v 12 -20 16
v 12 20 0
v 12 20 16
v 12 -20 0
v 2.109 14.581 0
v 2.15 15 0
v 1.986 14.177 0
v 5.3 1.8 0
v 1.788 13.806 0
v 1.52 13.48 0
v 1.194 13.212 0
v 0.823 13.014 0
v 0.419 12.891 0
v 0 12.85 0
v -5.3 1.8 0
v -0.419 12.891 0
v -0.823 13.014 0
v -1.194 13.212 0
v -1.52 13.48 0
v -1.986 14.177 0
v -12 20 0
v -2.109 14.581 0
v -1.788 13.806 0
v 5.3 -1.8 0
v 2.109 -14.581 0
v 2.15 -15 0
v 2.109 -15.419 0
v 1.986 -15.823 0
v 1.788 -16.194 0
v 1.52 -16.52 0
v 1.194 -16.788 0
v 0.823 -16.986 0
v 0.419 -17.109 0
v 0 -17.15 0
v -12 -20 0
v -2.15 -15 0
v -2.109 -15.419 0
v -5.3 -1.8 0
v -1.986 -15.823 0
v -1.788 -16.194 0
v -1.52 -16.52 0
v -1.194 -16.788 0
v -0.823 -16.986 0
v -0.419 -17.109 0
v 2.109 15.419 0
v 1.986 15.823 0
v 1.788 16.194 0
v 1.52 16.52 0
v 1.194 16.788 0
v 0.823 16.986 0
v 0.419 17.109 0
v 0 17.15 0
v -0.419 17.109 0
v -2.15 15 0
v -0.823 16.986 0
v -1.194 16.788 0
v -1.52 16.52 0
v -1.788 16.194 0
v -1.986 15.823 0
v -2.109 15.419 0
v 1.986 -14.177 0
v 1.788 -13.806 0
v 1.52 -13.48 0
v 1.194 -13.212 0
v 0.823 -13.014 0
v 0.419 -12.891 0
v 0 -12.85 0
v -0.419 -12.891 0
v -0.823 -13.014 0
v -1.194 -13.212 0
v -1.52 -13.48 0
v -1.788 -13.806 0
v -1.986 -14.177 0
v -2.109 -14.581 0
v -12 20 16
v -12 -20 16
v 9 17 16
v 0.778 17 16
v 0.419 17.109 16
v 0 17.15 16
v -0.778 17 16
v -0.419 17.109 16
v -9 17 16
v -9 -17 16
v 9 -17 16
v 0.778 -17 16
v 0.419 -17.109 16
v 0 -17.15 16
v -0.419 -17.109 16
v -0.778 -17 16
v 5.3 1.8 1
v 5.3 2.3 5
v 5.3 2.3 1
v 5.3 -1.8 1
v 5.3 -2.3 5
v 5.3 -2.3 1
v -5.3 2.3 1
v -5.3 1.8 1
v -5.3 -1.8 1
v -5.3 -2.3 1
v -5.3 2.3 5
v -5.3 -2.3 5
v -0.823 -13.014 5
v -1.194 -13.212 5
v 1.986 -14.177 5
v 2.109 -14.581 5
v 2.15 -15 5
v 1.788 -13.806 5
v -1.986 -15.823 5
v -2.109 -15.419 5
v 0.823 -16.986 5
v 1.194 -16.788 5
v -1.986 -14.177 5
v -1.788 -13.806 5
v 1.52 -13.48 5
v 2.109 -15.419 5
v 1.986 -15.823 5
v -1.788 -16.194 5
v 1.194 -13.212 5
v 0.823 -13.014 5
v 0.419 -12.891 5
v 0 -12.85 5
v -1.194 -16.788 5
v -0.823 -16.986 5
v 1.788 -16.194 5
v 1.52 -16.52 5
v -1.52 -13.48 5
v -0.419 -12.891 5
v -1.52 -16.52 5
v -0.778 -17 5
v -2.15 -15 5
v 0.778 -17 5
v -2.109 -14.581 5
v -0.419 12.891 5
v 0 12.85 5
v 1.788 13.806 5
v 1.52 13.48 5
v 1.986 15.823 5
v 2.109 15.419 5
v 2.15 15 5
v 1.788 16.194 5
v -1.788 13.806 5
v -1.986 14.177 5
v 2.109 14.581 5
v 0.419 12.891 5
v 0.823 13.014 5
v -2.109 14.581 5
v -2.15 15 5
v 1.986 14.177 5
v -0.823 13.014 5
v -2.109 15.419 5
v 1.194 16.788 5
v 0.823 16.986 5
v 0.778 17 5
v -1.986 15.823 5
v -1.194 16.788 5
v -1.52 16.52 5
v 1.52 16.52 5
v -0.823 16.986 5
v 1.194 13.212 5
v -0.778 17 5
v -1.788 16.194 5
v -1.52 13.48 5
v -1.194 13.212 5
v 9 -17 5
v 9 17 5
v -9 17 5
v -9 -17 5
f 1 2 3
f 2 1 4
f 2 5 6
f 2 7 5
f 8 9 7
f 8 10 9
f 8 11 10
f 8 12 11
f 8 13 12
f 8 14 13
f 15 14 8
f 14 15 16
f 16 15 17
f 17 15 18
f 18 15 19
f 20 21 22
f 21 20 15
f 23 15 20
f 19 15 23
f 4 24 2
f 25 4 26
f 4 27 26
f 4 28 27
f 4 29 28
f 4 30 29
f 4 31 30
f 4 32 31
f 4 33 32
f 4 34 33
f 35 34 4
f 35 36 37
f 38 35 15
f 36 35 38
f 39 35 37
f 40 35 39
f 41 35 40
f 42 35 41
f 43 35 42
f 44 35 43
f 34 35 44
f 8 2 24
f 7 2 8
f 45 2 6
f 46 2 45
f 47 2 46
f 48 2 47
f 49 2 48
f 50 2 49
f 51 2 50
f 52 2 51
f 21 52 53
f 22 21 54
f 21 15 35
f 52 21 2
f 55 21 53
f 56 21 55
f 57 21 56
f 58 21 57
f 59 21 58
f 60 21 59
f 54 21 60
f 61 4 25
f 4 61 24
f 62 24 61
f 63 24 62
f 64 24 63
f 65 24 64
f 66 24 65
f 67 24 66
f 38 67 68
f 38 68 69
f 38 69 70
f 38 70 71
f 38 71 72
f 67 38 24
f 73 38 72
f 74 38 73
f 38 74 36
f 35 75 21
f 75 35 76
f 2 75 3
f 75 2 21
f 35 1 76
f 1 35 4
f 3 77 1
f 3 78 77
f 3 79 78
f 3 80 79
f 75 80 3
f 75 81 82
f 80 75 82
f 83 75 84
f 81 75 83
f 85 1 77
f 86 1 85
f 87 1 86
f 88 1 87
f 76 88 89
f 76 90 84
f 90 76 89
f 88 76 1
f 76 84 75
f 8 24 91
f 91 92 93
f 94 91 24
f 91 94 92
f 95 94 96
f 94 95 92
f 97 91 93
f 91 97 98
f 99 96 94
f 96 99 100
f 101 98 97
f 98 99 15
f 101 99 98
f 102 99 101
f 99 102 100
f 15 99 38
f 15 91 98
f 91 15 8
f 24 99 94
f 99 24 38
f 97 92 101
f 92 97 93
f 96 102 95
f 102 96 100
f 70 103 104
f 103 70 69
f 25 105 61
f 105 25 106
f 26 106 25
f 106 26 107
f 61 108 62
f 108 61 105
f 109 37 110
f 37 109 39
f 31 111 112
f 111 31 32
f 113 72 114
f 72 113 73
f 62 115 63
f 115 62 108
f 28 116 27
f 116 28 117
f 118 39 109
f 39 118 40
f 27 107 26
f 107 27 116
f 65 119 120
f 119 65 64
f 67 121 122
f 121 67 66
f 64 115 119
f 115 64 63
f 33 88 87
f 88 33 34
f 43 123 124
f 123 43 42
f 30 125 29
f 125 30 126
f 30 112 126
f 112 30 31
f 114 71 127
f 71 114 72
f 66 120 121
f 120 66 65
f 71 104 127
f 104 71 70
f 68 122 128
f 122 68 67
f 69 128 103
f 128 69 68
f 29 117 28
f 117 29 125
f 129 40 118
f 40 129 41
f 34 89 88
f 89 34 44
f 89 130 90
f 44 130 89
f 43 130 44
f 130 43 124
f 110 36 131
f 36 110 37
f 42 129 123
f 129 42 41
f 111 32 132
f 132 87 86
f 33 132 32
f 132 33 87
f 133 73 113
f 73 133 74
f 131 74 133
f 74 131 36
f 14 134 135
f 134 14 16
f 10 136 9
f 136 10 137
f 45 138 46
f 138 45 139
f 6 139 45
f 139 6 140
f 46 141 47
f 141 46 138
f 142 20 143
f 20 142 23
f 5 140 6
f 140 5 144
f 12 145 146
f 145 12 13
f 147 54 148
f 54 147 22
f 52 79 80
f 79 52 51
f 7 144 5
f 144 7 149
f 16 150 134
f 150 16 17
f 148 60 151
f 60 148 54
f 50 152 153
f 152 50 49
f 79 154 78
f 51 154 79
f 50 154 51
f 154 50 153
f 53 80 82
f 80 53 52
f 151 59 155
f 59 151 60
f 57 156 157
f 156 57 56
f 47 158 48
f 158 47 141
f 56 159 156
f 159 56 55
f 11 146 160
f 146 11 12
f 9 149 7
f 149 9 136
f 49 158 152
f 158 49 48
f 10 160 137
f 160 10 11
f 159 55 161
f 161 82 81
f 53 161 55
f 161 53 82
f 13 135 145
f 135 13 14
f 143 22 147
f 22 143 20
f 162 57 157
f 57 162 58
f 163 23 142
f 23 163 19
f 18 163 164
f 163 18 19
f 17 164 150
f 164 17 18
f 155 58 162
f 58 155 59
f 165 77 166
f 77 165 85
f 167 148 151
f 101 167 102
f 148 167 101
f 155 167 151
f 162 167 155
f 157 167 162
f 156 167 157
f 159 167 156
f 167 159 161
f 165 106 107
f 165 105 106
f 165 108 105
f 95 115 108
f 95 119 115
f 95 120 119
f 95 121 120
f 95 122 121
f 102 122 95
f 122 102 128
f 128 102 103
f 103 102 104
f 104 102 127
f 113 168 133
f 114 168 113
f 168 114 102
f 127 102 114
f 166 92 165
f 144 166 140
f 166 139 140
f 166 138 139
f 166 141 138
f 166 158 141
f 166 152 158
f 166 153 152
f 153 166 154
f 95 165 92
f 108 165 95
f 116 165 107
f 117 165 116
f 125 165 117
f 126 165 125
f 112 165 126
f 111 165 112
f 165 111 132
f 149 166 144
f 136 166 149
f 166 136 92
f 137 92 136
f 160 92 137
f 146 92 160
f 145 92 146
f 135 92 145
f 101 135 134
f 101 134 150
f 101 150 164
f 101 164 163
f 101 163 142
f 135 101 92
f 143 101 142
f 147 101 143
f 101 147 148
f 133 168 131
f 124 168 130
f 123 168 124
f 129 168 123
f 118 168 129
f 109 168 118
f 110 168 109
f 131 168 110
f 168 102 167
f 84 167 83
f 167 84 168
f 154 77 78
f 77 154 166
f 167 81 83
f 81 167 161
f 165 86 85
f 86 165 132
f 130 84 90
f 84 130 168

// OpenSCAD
// ============================================================
// RSAポート用 ポゴピン"ブロック"収納ハウジング
// ============================================================
//
// 対象部品: 貫通型ポゴピンブロック（表裏に4本ずつ、見た目のチップは
// 計8個だが表裏は電気的に同じ線でつながっており独立回路は4系統）。
//
// 実測値（2026-09-01ユーザー計測）:
//   - ブロック全長（ピンが並ぶ方向, X） = 10mm
//   - ブロック厚み（ピンが突き出る方向, Z）= 5mm
//   - ポゴピン全長                       = 10mm
//     → 前後に (10-5)/2 = 2.5mm ずつ突出する計算
//
// 【未確認・要注意】
//   - 幅（Y方向、行に対して垂直の奥行き）は未計測。block_width_y は
//     プレースホルダーなので実物と合わなければ調整すること
//   - このブロックは独立4系統しかなく、CAN方式で必要な5系統
//     （VCC/CANH/CANL/AD_COM/GND）には1本足りない。AD_COM用に
//     バラの個別ポゴピンを追加するか、要件を見直す必要がある
//     （本ファイルは「ブロックを収める箱」だけを提供する）
//   - ピンのばね圧縮ストロークが2.5mmより短い場合、実機に密着させた
//     ときに底突きする可能性がある。組み立て後に必ず確認すること
//
// 【固定方法】
//   ブロックの前面が内側の段差（肩）に突き当たって止まる構造。
//   前面窓は奥のポケットよりY方向だけ一回り小さくしてあり
//   （X方向はピン位置が不明なため窓を狭めない＝全長ぶん開けておく）、
//   ここでピンの頭だけが外に出る。ブロック本体はその奥の
//   ポケット（block_len×block_width_y×block_thickness、
//   pocket_clearance分の余裕）に収まり、肩に当たった位置で止まるので
//   押し込む深さで迷わない。仮固定後、配線室側からエポキシを
//   流し込んで固定する。
//
// ============================================================

// ---------- PARAMETERS ----------

block_len        = 10;   // 実測: ピン並び方向の全長 [mm]
block_thickness  = 5;    // 実測: ピン突出方向の厚み [mm]
block_width_y    = 4;    // ★未実測(推定値): 奥行き方向の幅 [mm]。実物に合わせて調整
pocket_clearance = 0.3;  // ブロックとポケットの片側クリアランス [mm]

shoulder_depth     = 1.0; // 前面の肩（窓）の厚み [mm]
pin_window_margin_y = 0.5; // 前面窓をY方向だけ狭める片側マージン[mm]（肩の幅になる）
                            // X方向は窓を狭めない（ピンの正確な位置が未確認のため塞がない）

// 上下のM4固定穴（RSAポート実測前のプレースホルダー。rsa_pogo_housing.scadと同じ値）
mount_hole_dia      = 4.3;
mount_hole_spacing  = 30.0;
mount_hole_offset_x = 0;

// ハウジング寸法
housing_w = 24;
housing_h = 40;
housing_wall_t = 3;
wire_cavity_depth = 10;

// ---------- 内部計算 ----------
plate_t = shoulder_depth + block_thickness; // 前面プレート全体の厚み（肩+ブロック厚み分を確保）

pocket_len_x = block_len + 2*pocket_clearance;
pocket_len_y = block_width_y + 2*pocket_clearance;
window_x = pocket_len_x;                         // X方向は窓を狭めない
window_y = pocket_len_y - 2*pin_window_margin_y;  // Y方向だけ肩をつくる

// 参考値（プレビュー確認用）: 前面から見たピン突出量
pin_protrusion = (10 - block_thickness) / 2; // ポゴピン全長10mm前提
front_face_tip_stickout = pin_protrusion - shoulder_depth; // ハウジング前面(z=0)からの突き出し量
echo(str("参考: ハウジング前面からのピン突き出し量 = ", front_face_tip_stickout, " mm"));

module mount_holes() {
    for (dy = [-mount_hole_spacing/2, mount_hole_spacing/2])
        translate([mount_hole_offset_x, dy, 0])
        children();
}

// ブロック用ポケット（前面窓＋段差＋本体収納部）
module block_pocket() {
    union() {
        // 前面窓（肩から前面まで貫通。ピンの頭がここを通る）
        translate([-window_x/2, -window_y/2, -1])
            cube([window_x, window_y, shoulder_depth + 1]);
        // ブロック収納ポケット（肩の奥。配線室側へつながる深さまで）
        translate([-pocket_len_x/2, -pocket_len_y/2, shoulder_depth])
            cube([pocket_len_x, pocket_len_y, plate_t - shoulder_depth + 1]);
    }
}

// 【修正: 背面は塞がない】以前の版は配線室の外壁を作った際に背面まで
// 塞いでしまい、ブロックの差し込み口もジャンパー線の取り出し口も
// 存在しない完全密閉の箱になっていた（組み立て不可能なミス）。
// 側壁だけのトンネル状にして前後とも開放し、後ろからブロックを挿入
// →ハンダ付け→配線の引き出しができるようにする。防塵等が必要なら
// 動作確認後に別途フタを設計して被せる想定（今回は機能優先）。
module full_housing() {
    difference() {
        union() {
            // 前面プレート（肩+ブロック厚み分の厚み）
            translate([-housing_w/2, -housing_h/2, 0])
                cube([housing_w, housing_h, plate_t]);
            // 側壁のみのトンネル（背面は開放＝フタなし）
            translate([-housing_w/2, -housing_h/2, plate_t])
                cube([housing_w, housing_h, wire_cavity_depth]);
        }

        // トンネルの内側を前後まるごと貫通させる（壁厚housing_wall_tだけ残す）
        translate([
            -housing_w/2 + housing_wall_t,
            -housing_h/2 + housing_wall_t,
            plate_t - 1
        ])
            cube([
                housing_w - 2*housing_wall_t,
                housing_h - 2*housing_wall_t,
                wire_cavity_depth + 2
            ]);

        // ブロック用ポケット＋前面窓
        block_pocket();

        // M4固定穴
        mount_holes()
            translate([0, 0, -1])
            cylinder(d = mount_hole_dia, h = plate_t + wire_cavity_depth + 2, $fn = 32);
    }
}

full_housing();
